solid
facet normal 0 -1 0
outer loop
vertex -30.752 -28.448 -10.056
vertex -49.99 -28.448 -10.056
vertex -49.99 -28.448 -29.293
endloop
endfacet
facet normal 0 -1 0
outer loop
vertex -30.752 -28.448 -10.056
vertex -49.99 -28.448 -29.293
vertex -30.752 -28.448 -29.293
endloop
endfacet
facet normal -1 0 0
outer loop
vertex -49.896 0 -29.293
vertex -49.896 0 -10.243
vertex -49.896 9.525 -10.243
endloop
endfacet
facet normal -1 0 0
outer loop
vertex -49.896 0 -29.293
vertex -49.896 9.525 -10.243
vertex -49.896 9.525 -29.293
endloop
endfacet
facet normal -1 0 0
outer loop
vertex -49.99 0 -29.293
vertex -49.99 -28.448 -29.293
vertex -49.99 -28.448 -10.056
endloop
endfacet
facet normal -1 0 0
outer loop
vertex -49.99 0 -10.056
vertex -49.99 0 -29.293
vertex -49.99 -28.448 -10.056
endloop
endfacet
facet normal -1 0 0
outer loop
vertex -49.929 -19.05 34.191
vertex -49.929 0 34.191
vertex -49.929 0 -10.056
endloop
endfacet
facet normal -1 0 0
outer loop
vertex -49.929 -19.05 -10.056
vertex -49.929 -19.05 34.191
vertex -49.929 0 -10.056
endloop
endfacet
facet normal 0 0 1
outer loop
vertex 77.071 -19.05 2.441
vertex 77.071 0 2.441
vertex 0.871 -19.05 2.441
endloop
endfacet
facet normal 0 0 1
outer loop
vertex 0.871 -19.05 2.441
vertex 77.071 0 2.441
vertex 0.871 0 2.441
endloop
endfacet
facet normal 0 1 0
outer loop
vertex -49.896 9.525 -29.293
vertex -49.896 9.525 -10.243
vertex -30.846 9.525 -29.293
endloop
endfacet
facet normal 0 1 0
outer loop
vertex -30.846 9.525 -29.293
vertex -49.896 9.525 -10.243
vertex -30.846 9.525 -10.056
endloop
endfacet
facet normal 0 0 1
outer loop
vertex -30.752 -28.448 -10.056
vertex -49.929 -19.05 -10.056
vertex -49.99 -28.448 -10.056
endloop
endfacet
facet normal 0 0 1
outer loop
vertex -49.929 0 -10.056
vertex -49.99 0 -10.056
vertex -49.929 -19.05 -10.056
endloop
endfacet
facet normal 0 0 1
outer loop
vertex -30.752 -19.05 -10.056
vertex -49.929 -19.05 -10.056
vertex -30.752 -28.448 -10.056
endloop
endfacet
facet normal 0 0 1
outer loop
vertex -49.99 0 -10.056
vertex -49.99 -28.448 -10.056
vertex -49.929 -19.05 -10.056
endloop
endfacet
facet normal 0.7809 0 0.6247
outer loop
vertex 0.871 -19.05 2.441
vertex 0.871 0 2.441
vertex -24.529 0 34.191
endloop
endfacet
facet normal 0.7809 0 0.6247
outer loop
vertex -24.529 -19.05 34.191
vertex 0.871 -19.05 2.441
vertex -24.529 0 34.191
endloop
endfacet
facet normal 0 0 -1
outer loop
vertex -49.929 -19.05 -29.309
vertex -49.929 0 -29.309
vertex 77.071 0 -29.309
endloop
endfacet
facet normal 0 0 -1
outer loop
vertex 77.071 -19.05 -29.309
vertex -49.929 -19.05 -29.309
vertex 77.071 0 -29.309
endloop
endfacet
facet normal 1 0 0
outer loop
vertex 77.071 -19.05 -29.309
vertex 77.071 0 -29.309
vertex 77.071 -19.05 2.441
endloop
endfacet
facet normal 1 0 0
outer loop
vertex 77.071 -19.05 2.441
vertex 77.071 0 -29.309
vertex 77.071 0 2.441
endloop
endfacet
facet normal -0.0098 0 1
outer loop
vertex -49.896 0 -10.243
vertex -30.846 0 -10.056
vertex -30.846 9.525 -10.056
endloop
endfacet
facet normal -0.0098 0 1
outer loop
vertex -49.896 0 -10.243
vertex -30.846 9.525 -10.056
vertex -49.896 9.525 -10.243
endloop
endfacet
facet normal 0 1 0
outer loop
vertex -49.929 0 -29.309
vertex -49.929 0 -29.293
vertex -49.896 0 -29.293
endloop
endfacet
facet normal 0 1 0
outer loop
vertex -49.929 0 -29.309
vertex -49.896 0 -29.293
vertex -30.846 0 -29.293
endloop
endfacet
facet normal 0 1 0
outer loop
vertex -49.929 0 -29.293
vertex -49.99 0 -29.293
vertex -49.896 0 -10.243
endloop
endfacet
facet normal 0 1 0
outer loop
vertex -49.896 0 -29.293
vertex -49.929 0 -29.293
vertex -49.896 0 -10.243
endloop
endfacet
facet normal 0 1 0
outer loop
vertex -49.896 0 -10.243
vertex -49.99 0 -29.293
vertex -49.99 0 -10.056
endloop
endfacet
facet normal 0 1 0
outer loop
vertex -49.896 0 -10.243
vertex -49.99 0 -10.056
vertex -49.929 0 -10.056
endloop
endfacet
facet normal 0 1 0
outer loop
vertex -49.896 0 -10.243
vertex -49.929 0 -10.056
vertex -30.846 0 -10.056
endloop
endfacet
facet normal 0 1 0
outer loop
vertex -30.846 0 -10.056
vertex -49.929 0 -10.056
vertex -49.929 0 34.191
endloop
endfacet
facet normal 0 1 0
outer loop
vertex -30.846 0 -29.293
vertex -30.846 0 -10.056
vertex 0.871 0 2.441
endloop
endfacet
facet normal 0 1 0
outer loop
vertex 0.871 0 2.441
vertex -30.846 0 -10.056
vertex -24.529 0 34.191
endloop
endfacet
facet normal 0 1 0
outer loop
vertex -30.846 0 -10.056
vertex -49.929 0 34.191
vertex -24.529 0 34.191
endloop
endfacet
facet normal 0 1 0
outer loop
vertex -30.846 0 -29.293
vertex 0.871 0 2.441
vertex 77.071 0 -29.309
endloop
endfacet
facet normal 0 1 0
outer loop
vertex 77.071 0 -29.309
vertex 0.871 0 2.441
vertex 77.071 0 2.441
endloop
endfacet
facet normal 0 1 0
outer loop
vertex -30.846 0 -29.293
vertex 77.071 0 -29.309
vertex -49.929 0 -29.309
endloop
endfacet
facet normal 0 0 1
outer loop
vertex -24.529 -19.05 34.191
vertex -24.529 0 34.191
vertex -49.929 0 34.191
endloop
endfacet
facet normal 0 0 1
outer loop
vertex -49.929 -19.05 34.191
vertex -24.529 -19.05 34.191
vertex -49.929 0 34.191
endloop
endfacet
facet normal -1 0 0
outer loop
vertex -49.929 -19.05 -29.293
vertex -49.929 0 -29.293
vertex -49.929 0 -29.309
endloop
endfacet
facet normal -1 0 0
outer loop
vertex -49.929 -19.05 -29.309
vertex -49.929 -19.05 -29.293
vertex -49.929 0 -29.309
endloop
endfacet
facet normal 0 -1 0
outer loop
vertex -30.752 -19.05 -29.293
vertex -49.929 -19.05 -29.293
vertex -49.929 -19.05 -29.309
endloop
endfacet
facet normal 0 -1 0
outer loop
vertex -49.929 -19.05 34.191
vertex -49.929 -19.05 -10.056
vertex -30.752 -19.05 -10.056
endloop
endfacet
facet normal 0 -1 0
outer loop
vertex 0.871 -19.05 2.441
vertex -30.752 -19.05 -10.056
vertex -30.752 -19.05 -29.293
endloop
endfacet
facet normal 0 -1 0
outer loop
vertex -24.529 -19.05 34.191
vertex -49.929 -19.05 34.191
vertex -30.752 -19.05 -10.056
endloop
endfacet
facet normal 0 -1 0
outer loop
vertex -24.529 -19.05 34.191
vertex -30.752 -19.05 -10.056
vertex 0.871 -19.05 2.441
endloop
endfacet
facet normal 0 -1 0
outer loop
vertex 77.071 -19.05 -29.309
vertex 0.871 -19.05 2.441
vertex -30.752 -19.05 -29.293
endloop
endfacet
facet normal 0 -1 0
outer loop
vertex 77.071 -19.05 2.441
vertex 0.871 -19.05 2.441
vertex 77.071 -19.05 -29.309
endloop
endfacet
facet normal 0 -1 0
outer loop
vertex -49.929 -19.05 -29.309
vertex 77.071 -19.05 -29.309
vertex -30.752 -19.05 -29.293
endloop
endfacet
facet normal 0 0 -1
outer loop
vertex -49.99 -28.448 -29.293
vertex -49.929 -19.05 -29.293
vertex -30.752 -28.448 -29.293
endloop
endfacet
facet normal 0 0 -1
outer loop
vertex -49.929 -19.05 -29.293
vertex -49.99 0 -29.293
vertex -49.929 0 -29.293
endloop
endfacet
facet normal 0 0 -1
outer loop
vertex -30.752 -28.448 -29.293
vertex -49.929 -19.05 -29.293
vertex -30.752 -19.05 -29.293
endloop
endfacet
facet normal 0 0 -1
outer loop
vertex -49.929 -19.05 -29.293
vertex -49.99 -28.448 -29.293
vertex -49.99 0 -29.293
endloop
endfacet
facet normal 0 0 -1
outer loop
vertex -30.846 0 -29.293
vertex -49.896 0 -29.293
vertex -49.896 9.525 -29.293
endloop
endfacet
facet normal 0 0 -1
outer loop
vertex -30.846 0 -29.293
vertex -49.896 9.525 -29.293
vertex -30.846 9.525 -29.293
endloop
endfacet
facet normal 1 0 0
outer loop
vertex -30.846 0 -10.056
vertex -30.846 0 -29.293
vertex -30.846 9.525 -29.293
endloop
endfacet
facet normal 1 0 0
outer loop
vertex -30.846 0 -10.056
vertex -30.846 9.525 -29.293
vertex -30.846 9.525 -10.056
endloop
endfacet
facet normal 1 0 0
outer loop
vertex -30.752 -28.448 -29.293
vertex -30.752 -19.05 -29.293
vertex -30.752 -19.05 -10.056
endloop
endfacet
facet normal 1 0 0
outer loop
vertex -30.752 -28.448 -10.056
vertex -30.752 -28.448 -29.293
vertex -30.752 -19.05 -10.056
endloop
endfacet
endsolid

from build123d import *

# Parameters (mm, degrees)
F1_DEPTH = 19.05
F3_DEPTH = 9.525
F4_W     = 19.237377
F4_H     = 19.237377
F5_DEPTH = 28.448


with BuildPart() as f1:
    # F0 (on Front) → F1 (new body)
    with BuildSketch(Plane.XZ):
        Polygon((-24.528947, 34.191047), (-49.928947, 34.191047), (-49.928947, -29.308953), (77.071053, -29.308953), (77.071053, 2.441047), (0.871053, 2.441047), align=None)
    extrude(amount=F1_DEPTH)

    # F2 (on Front) → F3 (join)
    with BuildSketch(Plane.XZ):
        Polygon((-49.896031, -10.243278), (-49.896031, -29.293278), (-30.846031, -29.293278), (-30.846031, -10.055901), align=None)
    extrude(amount=-F3_DEPTH)

    # F4 (on Front) → F5 (join)
    with BuildSketch(Plane.XZ):
        with Locations((-40.371031, -19.674589)):
            Rectangle(F4_W, F4_H)
    extrude(amount=F5_DEPTH)


solid = f1.part
